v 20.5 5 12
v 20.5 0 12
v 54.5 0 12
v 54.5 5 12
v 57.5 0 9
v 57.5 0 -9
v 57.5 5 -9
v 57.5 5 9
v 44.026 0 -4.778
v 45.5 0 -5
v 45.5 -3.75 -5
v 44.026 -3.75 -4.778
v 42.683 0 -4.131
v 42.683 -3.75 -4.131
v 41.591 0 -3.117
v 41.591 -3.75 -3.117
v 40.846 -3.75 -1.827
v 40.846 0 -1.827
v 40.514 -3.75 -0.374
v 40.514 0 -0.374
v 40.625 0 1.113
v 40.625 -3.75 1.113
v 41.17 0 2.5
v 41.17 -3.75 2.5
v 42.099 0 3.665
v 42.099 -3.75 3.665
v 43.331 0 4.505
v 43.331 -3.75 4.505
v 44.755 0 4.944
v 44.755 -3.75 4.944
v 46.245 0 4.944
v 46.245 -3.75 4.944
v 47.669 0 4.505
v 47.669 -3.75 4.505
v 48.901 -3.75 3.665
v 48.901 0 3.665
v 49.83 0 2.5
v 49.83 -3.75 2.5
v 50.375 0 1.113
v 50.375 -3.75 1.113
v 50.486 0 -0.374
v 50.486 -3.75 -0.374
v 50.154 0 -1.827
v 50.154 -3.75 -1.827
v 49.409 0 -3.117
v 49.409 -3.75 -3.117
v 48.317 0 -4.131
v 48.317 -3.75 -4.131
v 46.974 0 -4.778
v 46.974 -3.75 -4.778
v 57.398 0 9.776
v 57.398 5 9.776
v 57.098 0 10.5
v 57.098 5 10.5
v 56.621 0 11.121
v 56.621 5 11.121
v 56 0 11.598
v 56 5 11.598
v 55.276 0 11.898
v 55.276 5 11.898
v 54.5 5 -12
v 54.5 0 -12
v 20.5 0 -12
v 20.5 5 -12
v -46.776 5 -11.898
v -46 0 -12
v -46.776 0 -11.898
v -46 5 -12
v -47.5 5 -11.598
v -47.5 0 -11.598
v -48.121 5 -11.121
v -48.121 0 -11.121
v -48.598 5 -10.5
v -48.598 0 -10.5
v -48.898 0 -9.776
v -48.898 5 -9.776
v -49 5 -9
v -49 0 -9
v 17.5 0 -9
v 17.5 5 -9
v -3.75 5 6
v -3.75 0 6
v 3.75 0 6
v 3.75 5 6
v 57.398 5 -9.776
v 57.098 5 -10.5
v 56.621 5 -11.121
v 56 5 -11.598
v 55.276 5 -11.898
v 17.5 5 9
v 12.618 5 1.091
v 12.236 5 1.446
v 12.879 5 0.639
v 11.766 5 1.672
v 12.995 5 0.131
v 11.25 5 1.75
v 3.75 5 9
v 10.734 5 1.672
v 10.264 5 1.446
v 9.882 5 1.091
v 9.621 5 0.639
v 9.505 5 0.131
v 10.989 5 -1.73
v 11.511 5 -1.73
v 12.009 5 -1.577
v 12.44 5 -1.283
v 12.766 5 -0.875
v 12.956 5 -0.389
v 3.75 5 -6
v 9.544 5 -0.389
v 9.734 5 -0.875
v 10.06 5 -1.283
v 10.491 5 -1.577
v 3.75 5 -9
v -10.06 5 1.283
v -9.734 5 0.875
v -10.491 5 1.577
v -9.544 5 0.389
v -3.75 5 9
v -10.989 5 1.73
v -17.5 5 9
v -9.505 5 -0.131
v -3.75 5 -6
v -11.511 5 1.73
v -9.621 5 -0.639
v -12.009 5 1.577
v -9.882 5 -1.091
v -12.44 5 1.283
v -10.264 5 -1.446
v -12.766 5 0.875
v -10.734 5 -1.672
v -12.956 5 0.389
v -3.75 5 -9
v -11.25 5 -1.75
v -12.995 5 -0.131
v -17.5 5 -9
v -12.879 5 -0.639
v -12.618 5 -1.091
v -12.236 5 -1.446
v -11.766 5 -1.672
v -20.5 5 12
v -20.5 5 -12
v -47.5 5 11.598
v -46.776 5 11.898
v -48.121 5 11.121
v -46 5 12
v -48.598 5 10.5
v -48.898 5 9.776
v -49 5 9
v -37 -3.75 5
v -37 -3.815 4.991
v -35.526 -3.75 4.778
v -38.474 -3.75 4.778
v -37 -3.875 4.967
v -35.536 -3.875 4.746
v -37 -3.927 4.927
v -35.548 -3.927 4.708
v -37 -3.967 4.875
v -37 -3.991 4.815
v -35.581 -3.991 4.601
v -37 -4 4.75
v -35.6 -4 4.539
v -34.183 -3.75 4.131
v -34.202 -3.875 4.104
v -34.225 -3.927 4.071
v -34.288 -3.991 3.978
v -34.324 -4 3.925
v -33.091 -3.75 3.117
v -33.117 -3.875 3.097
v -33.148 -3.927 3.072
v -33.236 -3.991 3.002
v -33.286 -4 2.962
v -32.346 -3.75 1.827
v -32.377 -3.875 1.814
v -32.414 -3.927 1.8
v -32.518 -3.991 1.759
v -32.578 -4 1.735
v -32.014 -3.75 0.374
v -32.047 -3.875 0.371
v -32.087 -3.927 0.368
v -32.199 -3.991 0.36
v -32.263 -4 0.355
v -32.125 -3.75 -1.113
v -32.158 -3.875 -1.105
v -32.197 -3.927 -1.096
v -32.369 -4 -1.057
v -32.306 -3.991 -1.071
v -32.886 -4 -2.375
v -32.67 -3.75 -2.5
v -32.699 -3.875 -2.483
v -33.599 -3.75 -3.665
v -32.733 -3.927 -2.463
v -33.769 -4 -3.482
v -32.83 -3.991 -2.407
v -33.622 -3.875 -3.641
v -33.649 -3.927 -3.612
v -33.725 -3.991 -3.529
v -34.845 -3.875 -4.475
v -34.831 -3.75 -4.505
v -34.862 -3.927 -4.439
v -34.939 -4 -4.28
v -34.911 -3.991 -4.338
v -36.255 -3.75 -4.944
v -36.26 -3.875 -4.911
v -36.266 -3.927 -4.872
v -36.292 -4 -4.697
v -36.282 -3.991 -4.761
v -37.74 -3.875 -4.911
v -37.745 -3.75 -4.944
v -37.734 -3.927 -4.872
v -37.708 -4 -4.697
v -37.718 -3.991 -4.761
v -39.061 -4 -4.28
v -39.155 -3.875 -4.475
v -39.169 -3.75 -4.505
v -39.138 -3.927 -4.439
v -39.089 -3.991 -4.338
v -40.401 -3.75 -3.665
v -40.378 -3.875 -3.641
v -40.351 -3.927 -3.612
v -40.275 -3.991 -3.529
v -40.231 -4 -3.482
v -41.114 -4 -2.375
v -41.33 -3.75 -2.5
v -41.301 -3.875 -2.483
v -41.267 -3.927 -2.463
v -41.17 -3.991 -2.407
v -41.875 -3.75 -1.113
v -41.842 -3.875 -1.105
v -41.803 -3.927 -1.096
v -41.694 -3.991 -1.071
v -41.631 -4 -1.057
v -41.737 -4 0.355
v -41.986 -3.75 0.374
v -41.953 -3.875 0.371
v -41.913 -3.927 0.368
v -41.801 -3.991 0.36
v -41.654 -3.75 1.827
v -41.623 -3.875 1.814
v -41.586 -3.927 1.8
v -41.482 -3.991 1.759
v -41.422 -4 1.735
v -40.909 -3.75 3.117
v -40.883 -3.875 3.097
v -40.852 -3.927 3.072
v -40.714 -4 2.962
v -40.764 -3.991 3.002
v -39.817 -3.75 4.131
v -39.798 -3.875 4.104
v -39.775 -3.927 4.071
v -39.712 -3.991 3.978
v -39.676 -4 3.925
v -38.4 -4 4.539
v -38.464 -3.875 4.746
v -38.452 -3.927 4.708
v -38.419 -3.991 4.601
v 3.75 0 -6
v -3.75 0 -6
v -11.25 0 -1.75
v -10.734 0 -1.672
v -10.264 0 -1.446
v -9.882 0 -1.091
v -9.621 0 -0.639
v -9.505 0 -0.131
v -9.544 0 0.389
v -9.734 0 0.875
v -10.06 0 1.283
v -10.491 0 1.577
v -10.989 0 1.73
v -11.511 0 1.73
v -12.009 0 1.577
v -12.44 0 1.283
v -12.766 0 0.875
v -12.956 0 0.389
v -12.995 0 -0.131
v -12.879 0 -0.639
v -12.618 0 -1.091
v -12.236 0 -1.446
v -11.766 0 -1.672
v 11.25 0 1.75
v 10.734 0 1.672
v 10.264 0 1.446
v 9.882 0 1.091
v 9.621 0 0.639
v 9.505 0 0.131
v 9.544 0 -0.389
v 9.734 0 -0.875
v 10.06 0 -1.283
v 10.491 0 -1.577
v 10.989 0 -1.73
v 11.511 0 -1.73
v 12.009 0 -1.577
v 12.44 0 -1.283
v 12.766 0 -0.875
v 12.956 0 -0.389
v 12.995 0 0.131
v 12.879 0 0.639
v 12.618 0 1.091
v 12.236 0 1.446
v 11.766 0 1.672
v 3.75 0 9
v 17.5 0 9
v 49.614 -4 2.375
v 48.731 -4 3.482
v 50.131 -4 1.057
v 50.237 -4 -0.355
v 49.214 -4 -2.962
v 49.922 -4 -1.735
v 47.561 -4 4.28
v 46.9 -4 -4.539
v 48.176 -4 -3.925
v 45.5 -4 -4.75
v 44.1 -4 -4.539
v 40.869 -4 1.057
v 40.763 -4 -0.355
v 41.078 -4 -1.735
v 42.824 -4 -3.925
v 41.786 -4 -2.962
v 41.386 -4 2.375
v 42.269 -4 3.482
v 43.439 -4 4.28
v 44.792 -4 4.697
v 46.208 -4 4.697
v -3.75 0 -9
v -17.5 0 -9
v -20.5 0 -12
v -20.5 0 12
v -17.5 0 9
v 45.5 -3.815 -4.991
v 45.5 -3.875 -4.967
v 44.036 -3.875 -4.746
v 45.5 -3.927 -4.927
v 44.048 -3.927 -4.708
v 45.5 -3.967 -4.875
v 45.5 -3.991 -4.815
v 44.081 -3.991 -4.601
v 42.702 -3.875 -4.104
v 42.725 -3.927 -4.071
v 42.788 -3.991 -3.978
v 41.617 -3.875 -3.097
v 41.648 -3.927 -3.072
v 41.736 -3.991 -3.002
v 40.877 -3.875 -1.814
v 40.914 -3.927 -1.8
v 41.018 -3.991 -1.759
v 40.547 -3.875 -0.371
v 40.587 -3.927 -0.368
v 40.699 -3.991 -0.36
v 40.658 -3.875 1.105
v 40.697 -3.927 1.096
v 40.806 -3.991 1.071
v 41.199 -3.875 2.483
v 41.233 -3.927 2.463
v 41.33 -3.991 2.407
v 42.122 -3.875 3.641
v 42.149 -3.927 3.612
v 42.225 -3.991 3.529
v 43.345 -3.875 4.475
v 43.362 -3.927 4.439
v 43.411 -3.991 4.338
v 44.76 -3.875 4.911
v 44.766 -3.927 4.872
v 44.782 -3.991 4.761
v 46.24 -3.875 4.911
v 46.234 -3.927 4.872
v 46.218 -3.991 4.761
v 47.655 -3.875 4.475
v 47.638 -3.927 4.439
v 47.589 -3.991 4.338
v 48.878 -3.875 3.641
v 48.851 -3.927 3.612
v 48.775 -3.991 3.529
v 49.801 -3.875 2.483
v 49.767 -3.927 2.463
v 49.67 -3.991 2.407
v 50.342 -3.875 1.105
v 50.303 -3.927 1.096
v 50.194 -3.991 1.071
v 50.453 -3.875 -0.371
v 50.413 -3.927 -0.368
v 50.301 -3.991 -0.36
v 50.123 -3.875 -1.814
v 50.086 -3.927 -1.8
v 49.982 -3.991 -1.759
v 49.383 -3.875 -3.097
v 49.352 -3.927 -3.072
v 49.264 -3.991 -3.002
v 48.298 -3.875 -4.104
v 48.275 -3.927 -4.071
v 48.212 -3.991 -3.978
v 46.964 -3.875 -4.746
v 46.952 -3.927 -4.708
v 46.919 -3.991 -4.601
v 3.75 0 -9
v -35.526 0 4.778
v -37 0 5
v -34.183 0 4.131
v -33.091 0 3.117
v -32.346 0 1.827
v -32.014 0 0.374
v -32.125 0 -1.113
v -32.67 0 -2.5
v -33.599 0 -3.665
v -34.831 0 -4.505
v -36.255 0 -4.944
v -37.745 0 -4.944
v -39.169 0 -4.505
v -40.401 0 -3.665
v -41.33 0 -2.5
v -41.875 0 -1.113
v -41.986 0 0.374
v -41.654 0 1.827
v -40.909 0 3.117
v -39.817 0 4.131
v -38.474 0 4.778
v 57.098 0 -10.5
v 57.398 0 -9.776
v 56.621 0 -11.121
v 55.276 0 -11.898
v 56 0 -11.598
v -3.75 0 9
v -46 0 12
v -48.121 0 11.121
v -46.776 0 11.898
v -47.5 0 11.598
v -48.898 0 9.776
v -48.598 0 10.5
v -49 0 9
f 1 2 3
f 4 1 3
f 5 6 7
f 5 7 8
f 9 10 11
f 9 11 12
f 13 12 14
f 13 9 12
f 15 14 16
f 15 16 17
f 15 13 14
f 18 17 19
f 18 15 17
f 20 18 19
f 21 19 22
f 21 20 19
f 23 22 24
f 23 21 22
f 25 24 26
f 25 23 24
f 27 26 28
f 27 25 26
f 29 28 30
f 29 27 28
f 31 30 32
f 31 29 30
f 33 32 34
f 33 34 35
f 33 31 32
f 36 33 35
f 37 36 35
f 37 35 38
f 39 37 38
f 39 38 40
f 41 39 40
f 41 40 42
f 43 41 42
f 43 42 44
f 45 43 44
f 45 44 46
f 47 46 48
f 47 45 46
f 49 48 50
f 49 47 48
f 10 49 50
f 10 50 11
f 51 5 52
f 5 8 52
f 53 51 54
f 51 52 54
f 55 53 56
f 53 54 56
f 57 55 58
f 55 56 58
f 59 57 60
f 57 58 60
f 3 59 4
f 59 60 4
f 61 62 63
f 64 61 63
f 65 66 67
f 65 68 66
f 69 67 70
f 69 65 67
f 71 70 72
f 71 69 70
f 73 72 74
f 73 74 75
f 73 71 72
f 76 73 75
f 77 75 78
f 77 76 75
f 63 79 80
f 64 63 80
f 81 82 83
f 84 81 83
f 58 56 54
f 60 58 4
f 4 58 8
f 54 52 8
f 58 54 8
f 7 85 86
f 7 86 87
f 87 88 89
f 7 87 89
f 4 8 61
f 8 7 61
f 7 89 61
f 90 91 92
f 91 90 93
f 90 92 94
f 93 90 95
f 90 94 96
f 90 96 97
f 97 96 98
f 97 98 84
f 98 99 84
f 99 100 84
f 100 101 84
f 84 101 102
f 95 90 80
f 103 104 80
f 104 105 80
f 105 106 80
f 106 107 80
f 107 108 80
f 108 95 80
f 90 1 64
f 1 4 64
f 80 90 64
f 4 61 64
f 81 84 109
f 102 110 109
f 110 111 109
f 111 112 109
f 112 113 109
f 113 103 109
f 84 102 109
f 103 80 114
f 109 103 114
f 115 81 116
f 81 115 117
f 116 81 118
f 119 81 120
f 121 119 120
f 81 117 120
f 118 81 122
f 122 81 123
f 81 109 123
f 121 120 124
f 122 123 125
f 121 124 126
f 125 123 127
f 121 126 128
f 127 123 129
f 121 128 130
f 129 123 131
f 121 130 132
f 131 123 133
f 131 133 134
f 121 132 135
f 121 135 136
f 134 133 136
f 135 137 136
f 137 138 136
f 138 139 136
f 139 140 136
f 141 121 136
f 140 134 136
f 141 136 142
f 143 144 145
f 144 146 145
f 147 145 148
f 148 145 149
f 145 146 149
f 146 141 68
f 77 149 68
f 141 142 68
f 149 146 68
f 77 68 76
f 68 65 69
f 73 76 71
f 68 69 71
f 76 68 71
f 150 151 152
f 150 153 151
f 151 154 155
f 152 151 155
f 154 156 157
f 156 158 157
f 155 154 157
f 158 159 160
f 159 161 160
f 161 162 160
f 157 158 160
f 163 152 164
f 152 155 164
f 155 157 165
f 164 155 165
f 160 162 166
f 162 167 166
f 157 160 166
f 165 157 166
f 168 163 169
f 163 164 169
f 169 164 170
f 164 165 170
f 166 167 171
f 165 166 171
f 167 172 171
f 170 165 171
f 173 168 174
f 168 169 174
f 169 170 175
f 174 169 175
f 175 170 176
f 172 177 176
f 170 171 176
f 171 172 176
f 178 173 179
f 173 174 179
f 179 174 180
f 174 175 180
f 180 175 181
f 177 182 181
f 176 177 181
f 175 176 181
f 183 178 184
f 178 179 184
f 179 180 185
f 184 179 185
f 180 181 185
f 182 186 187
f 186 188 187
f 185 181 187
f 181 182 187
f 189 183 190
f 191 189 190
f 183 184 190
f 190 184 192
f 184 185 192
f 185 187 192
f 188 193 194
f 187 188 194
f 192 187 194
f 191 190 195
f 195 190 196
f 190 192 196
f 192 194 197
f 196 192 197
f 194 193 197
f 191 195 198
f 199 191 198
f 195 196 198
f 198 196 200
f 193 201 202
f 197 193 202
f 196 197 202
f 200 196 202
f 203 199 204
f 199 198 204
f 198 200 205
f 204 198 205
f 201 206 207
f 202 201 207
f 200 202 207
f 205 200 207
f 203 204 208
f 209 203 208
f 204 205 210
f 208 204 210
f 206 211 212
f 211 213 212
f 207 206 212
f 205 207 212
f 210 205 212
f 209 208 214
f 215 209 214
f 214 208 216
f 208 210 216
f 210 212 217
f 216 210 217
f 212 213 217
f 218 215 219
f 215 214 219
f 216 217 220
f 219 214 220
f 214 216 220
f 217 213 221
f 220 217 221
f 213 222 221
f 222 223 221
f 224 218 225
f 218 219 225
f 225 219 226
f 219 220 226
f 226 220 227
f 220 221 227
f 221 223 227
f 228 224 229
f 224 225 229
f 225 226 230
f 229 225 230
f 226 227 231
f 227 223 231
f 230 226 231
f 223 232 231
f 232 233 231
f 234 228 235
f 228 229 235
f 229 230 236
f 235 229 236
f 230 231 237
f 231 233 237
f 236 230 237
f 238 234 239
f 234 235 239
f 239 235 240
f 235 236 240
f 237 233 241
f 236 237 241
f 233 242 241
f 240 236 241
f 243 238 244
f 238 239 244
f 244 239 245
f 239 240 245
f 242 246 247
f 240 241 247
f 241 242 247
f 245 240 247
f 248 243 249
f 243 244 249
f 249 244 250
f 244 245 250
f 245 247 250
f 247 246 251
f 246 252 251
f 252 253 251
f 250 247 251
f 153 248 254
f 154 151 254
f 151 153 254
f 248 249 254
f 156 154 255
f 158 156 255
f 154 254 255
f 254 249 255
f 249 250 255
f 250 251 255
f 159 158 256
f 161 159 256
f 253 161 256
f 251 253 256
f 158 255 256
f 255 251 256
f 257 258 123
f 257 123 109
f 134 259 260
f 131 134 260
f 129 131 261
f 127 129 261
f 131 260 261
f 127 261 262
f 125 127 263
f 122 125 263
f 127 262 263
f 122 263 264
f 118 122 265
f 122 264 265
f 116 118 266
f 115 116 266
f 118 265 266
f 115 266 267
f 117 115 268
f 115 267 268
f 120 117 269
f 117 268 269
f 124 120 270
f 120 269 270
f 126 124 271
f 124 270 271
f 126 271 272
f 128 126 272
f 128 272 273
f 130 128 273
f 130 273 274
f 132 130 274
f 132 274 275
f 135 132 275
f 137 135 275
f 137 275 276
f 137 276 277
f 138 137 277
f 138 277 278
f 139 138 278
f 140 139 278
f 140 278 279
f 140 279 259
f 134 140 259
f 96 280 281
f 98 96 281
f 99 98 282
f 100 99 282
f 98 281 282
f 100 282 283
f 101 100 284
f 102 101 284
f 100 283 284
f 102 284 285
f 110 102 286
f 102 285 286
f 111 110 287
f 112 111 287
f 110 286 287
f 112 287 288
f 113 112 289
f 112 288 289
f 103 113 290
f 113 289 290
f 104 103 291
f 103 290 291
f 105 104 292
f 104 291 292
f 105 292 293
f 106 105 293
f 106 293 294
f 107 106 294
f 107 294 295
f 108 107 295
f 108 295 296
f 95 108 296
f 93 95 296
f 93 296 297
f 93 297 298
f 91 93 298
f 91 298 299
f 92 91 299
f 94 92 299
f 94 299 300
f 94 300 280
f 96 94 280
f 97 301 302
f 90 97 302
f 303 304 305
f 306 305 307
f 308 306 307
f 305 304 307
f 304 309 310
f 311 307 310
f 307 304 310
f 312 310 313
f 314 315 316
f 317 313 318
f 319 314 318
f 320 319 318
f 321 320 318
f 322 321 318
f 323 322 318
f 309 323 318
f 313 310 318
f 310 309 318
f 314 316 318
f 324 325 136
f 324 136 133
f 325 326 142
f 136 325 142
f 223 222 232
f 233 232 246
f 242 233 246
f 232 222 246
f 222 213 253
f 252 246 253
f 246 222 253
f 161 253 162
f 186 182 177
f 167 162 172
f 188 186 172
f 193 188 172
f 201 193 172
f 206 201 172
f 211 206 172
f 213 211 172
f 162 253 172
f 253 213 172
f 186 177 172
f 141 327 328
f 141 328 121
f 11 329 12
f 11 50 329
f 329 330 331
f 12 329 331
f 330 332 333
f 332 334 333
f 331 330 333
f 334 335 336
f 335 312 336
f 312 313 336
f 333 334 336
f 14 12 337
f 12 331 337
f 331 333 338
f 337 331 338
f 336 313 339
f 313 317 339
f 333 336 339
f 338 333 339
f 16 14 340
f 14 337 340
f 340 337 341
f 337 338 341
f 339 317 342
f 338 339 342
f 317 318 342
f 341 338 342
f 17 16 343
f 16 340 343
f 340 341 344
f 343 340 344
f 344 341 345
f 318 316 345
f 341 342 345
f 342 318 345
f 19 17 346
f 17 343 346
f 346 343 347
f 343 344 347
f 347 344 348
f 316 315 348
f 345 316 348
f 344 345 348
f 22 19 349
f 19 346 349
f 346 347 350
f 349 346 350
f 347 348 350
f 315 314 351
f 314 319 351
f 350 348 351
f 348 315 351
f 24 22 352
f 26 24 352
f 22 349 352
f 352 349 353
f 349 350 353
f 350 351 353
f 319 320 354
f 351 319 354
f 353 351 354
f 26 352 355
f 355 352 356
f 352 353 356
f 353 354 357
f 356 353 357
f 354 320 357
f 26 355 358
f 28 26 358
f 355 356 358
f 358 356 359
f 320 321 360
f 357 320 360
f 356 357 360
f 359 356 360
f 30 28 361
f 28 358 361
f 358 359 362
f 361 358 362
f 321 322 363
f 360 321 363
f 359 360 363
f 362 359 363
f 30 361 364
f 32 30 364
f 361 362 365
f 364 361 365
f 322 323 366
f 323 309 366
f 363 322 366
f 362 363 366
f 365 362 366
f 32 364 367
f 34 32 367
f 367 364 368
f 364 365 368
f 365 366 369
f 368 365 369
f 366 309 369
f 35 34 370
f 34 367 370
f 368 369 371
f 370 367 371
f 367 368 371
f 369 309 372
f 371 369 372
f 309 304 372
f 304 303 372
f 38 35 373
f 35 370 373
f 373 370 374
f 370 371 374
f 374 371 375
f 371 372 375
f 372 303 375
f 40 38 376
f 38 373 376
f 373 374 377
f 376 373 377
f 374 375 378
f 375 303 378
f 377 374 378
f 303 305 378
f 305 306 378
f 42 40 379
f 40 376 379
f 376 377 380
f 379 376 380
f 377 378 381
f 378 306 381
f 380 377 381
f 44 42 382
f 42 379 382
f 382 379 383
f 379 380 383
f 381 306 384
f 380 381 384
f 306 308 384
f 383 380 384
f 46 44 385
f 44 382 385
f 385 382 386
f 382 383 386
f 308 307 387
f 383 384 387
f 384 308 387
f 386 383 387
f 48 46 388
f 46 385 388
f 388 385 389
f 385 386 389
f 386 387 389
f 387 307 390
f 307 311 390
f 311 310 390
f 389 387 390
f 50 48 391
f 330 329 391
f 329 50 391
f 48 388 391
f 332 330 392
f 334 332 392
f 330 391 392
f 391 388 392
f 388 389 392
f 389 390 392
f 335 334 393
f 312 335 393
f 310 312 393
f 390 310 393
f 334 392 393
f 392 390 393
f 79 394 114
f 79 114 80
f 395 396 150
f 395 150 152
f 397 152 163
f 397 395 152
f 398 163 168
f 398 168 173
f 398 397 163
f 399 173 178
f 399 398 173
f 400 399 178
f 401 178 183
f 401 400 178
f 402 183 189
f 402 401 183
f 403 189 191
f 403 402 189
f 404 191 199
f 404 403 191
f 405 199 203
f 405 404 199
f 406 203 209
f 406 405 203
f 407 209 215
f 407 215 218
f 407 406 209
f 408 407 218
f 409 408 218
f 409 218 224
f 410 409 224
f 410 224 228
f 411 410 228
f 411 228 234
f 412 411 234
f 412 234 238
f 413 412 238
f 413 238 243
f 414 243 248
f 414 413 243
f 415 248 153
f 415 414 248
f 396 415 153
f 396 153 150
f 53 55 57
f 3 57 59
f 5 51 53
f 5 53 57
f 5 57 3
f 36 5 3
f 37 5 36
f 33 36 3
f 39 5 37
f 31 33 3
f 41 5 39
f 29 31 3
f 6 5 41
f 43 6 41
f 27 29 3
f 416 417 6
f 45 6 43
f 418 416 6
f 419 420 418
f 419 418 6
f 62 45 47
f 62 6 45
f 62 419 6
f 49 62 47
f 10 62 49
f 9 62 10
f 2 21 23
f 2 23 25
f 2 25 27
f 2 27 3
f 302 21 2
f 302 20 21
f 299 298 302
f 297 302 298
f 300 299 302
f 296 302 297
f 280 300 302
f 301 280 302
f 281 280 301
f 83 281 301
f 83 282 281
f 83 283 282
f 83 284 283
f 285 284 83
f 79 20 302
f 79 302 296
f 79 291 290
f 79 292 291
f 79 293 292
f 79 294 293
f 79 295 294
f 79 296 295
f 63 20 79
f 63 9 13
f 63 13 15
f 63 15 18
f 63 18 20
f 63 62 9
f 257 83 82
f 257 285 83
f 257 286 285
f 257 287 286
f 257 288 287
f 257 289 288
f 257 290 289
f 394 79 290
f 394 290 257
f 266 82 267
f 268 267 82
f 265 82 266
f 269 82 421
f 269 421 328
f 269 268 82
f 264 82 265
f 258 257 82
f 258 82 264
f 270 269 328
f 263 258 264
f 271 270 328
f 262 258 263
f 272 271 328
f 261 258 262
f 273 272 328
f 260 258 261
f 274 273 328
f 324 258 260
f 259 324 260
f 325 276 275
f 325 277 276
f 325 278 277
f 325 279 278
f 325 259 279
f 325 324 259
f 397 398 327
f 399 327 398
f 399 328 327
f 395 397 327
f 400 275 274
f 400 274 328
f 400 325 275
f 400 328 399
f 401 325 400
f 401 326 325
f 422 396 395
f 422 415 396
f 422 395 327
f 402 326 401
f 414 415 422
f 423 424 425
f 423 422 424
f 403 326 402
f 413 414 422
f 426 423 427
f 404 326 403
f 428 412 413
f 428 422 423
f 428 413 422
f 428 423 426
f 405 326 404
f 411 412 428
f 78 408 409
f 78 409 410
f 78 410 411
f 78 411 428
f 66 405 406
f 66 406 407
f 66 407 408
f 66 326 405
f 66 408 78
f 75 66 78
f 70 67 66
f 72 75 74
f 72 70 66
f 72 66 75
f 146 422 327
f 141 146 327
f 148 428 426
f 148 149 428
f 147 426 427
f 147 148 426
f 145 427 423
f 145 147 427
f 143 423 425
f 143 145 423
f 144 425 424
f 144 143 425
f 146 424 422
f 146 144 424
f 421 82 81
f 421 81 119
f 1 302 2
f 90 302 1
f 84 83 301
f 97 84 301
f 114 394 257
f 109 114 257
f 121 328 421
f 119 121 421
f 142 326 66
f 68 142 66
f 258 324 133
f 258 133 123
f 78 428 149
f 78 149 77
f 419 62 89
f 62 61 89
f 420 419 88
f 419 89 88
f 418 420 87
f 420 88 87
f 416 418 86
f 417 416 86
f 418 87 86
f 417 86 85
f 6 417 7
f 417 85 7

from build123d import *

# Parameters (mm, degrees)
BOSS_EXTRUDE1_DEPTH = 5
SKETCH5_R           = 5
BOSS_EXTRUDE2_DEPTH = 4
SKETCH7_W           = 35
SKETCH7_H           = 3
CUT_EXTRUDE2_DEPTH  = 59.951251047
SKETCH6_W           = 7.5
SKETCH6_H           = 3
CUT_EXTRUDE1_DEPTH  = 59.951251047
SKETCH8_R           = 1.75
CUT_EXTRUDE3_DEPTH  = 59.951251047
FILLET3_R           = 3
FILLET2_R           = 0.25
CHAMFER1_SIZE       = 3


with BuildPart() as part:
    # Sketch1 → Boss-Extrude1 (new body)
    with BuildSketch(Plane(origin=(0, 0, 0), x_dir=(1, 0, 0), z_dir=(0, 1, 0))):
        Polygon((0, 12), (57.5, 12), (57.5, -12), (0, -12), (-49, -12), (-49, 12), align=None)
    extrude(amount=BOSS_EXTRUDE1_DEPTH)

    # Sketch5 → Boss-Extrude2 (add)
    with BuildSketch(Plane(origin=(0, 0, 0), x_dir=(1, 0, 0), z_dir=(0, 1, 0))):
        with Locations(Location((-37, 0, 0), (0, 0, 270))):
            Circle(SKETCH5_R)
        with Locations(Location((45.5, 0, 0), (0, 0, 90))):
            Circle(SKETCH5_R)
    extrude(amount=-BOSS_EXTRUDE2_DEPTH)

    # Sketch7 → Cut-Extrude2 (cut, through all)
    with BuildSketch(Plane.XZ):
        with Locations((0, 10.5)):
            Rectangle(SKETCH7_W, SKETCH7_H)
        with Locations((0, -10.5)):
            Rectangle(SKETCH7_W, SKETCH7_H)
    extrude(amount=-CUT_EXTRUDE2_DEPTH, mode=Mode.SUBTRACT)

    # Sketch6 → Cut-Extrude1 (cut, through all)
    with BuildSketch(Plane.XZ):
        with Locations((0, 7.5)):
            Rectangle(SKETCH6_W, SKETCH6_H)
        with Locations((0, -7.5)):
            Rectangle(SKETCH6_W, SKETCH6_H)
    extrude(amount=-CUT_EXTRUDE1_DEPTH, mode=Mode.SUBTRACT)

    # Sketch8 → Cut-Extrude3 (cut, through all)
    with BuildSketch(Plane.XZ):
        with Locations(Location((-11.25, 0, 0), (0, 0, 270))):
            Circle(SKETCH8_R)
        with Locations(Location((11.25, 0, 0), (0, 0, 90))):
            Circle(SKETCH8_R)
    extrude(amount=-CUT_EXTRUDE3_DEPTH, mode=Mode.SUBTRACT)

    # Fillet3
    fillet3_edges = [part.edges().sort_by_distance(p)[0] for p in [
        (-49, 2.5, 12),
        (-49, 2.5, -12),
        (57.5, 2.5, -12),
        (57.5, 2.5, 12),
    ]]
    fillet(fillet3_edges, radius=FILLET3_R)

    # Fillet2
    fillet2_edges = [part.edges().sort_by_distance(p)[0] for p in [
        (-37, -4, -5),
        (45.5, -4, 5),
    ]]
    fillet(fillet2_edges, radius=FILLET2_R)

    # Chamfer1
    chamfer1_edges = [part.edges().sort_by_distance(p)[0] for p in [
        (17.5, 2.5, 12),
        (-17.5, 2.5, 12),
        (17.5, 2.5, -12),
        (-17.5, 2.5, -12),
    ]]
    chamfer(chamfer1_edges, length=CHAMFER1_SIZE - 0.0001)  # a hair under: the kernel refuses the full size


solid = part.part
